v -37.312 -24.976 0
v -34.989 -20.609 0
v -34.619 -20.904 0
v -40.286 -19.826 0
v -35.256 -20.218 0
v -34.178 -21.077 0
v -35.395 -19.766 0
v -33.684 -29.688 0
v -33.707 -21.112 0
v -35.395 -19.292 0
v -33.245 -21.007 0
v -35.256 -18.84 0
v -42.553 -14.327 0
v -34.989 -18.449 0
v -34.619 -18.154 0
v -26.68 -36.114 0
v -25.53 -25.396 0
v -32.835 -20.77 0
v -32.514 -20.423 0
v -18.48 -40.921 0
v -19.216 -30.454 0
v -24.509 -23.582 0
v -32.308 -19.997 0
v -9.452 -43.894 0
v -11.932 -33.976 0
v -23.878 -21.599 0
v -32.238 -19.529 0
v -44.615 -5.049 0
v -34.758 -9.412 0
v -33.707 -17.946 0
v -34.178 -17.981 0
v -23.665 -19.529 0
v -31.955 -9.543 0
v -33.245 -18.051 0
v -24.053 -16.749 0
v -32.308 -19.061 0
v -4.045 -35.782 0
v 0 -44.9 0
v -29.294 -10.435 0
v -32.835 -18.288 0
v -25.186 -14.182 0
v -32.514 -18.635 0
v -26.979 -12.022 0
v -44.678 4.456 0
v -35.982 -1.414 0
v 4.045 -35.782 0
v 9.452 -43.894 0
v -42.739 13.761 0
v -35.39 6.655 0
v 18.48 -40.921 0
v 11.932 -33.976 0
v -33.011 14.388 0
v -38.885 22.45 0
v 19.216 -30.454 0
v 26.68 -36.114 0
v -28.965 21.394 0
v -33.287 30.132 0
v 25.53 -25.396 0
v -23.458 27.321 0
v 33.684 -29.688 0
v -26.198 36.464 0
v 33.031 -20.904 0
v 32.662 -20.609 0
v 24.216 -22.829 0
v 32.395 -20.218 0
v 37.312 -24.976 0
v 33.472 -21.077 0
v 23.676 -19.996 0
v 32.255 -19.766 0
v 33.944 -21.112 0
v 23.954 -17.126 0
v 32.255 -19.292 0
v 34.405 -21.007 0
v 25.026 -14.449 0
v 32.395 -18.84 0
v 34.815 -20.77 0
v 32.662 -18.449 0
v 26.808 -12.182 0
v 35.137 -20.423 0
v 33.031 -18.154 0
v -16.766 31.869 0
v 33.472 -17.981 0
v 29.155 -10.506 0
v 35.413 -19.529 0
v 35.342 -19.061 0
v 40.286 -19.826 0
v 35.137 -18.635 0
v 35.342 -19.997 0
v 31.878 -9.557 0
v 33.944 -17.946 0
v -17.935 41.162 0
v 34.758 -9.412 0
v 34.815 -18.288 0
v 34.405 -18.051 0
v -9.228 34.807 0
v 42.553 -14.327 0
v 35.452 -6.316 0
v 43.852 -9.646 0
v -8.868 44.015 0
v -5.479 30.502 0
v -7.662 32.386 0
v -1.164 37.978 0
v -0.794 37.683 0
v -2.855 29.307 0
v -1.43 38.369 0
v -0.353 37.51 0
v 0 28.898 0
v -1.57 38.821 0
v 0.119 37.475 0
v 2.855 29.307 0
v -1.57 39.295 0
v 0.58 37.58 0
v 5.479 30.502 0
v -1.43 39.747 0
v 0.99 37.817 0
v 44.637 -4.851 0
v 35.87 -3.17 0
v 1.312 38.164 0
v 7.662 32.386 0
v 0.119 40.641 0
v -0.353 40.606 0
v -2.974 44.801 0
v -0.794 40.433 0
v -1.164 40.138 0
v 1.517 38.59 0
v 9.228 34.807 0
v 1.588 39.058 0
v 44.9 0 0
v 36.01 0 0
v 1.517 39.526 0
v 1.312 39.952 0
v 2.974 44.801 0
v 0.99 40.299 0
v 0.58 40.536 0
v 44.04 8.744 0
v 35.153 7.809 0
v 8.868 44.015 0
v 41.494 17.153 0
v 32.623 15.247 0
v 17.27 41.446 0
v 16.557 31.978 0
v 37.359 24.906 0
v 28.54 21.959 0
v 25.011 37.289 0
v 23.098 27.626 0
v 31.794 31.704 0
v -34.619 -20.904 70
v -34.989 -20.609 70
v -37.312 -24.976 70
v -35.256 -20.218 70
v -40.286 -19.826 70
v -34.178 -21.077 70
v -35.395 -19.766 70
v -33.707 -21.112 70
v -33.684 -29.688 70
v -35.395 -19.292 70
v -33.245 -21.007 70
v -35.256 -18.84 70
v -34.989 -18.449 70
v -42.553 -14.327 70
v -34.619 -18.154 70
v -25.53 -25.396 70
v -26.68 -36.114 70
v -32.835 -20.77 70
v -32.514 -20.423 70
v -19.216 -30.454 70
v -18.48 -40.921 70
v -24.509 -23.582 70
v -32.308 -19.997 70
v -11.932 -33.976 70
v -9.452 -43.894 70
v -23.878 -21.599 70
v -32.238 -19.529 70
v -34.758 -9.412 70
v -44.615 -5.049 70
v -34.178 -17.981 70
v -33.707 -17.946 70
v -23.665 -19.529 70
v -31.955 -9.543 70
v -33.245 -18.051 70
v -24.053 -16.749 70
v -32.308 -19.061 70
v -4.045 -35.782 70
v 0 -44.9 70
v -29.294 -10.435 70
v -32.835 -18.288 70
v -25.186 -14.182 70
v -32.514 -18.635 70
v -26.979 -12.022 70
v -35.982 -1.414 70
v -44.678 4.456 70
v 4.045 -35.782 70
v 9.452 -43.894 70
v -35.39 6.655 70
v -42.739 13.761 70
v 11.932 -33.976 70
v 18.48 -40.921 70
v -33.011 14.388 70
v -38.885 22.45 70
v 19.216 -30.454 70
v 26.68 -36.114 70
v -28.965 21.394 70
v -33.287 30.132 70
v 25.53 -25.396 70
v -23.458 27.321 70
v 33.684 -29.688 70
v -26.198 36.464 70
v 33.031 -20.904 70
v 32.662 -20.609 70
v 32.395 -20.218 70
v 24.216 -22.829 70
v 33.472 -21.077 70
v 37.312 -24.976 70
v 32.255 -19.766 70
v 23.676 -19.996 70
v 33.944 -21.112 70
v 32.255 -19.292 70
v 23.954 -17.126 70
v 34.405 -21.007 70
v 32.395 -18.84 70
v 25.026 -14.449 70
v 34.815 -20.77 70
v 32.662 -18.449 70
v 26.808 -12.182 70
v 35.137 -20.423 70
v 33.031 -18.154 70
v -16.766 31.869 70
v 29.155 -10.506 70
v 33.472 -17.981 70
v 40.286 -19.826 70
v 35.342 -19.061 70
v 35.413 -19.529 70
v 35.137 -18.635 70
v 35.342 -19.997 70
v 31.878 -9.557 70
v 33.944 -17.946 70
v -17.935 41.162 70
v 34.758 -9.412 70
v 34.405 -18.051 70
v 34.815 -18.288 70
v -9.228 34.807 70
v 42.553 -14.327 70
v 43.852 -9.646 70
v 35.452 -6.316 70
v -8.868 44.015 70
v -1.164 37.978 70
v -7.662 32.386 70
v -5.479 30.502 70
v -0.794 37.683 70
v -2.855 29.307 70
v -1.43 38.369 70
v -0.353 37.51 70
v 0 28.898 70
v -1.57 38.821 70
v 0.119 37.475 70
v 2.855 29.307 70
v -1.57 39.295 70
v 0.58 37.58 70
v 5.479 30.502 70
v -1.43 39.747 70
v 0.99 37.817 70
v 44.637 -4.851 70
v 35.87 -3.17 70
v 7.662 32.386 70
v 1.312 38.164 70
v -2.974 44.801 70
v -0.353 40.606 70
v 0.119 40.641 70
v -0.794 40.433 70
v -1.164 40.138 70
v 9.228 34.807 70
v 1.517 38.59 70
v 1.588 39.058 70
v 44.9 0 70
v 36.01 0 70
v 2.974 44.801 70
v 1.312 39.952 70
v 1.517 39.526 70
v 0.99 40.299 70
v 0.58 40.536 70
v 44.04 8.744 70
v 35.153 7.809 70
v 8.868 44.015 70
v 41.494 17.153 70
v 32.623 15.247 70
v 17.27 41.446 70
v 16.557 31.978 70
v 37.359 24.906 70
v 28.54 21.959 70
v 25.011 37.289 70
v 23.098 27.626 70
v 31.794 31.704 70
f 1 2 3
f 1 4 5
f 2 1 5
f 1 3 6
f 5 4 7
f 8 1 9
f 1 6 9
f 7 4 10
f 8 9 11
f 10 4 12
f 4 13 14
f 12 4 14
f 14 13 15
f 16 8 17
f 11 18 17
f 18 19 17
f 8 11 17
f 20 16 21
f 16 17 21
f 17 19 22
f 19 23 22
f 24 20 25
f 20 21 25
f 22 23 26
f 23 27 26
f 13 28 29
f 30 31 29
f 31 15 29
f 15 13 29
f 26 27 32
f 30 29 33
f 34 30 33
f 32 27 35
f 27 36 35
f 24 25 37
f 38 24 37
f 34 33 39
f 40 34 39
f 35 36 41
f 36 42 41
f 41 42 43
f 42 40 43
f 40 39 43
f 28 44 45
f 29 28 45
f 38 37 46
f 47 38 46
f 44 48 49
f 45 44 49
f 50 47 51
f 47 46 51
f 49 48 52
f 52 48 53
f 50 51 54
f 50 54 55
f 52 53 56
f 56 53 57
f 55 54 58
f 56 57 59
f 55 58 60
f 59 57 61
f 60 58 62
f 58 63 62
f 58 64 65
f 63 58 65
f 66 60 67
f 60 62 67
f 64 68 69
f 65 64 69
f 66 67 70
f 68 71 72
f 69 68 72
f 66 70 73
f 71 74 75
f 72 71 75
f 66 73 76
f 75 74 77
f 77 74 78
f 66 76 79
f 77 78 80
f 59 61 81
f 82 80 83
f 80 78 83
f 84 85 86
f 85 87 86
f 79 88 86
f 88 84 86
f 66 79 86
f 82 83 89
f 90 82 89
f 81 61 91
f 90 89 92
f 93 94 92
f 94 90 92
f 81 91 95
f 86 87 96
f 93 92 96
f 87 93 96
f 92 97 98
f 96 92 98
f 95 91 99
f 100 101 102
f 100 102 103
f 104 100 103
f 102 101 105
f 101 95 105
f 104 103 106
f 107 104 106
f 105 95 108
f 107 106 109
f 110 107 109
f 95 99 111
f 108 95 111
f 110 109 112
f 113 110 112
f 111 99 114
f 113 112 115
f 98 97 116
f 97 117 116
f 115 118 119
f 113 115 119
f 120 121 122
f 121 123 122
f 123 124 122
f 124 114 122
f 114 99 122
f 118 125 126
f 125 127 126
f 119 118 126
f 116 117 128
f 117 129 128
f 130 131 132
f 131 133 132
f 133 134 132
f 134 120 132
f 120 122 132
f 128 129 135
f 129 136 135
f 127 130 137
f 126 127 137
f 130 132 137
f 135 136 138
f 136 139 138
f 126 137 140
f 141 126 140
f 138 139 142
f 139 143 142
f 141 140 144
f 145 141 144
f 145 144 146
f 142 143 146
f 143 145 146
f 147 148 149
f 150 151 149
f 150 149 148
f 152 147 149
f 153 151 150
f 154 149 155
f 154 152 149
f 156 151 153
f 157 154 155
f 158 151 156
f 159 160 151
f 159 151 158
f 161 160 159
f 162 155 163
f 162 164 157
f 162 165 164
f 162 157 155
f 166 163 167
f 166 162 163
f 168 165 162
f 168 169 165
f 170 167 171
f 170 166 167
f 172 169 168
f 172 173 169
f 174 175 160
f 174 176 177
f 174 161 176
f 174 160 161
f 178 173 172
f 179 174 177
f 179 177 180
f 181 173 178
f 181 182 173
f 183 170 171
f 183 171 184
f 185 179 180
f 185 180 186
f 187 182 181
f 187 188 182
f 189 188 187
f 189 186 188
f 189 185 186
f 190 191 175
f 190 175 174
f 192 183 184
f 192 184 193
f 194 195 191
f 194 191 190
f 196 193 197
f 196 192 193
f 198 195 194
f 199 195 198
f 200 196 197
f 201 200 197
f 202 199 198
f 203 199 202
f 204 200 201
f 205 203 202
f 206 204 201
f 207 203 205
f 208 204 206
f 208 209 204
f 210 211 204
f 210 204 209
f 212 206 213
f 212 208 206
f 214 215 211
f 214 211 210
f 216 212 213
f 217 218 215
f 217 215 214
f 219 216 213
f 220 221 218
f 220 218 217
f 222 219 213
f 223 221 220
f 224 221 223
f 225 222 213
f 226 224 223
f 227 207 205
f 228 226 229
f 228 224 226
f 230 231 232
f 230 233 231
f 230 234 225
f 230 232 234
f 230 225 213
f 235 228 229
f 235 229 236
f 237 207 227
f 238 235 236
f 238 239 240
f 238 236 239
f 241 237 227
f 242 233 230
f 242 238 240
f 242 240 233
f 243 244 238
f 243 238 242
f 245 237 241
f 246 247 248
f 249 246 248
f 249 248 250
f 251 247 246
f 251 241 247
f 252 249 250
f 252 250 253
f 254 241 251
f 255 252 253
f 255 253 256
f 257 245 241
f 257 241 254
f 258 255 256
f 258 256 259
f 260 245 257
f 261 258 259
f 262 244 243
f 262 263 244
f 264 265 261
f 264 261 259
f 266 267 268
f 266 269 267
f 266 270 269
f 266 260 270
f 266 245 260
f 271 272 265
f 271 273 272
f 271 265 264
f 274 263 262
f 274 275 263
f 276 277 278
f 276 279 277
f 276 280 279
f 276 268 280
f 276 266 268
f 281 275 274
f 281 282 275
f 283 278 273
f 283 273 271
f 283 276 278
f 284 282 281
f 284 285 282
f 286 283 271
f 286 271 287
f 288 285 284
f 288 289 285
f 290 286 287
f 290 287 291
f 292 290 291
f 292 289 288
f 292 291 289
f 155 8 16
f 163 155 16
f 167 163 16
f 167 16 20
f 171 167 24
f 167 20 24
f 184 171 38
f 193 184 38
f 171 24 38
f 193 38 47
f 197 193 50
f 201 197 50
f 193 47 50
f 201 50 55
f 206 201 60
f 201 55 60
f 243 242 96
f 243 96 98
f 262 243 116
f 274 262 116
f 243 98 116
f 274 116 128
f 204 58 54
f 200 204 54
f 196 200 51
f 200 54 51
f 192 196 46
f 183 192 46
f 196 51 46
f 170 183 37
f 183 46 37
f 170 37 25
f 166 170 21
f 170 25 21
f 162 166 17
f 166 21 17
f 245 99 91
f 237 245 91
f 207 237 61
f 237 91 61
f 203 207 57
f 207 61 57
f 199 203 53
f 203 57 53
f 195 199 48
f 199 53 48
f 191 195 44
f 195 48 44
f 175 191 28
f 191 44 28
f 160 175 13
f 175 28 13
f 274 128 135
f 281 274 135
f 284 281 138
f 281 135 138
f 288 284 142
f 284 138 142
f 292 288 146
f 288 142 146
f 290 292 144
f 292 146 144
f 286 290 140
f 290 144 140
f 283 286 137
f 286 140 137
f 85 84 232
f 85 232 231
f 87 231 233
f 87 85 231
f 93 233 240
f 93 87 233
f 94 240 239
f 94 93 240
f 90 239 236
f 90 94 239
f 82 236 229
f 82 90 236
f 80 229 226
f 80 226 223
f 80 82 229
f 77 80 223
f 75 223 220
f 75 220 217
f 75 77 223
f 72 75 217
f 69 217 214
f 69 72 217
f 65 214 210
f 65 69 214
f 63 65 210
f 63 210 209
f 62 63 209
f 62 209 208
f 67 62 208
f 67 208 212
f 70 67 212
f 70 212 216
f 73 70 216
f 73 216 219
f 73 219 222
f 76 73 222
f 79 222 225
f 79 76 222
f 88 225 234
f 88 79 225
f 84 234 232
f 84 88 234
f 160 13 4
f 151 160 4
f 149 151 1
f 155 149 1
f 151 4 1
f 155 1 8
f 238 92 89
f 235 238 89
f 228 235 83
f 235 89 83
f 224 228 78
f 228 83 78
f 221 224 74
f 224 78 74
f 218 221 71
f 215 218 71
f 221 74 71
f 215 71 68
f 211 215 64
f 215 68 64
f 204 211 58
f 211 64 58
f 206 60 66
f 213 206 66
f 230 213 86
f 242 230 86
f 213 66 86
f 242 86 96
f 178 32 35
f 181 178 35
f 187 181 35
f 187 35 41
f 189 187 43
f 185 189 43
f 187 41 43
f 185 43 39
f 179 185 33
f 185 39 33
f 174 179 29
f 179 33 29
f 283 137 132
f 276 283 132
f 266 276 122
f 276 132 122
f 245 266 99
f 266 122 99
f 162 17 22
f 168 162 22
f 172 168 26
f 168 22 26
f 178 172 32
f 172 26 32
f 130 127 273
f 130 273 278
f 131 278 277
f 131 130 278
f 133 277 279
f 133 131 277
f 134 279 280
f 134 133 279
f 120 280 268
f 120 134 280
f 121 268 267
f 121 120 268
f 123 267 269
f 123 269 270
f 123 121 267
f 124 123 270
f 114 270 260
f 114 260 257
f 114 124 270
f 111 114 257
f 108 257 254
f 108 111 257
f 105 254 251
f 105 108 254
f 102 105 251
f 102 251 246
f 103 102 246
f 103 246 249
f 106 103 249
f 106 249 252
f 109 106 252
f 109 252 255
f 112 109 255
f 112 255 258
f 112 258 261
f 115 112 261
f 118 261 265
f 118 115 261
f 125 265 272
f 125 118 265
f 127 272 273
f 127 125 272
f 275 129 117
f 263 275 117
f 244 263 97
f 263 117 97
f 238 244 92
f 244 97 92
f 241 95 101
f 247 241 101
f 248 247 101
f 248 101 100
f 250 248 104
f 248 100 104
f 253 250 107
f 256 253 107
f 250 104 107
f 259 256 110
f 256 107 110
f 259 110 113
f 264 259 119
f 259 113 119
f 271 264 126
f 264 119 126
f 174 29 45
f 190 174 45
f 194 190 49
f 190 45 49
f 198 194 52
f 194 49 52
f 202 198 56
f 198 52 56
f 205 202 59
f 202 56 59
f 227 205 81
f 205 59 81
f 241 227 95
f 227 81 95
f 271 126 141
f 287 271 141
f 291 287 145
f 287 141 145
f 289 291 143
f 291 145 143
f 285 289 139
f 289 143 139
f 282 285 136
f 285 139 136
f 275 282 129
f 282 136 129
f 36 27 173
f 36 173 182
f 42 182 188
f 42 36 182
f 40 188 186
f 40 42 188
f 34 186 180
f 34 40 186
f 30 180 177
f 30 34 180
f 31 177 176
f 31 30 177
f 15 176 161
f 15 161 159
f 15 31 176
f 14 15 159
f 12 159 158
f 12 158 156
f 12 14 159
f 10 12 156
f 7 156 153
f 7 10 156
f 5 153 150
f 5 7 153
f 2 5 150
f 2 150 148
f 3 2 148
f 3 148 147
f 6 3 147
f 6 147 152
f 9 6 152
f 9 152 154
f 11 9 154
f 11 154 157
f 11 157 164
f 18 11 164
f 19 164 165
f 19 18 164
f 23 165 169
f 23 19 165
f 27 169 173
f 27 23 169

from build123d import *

# Parameters (mm, degrees)
F0_R     = 1.5875
F1_DEPTH = 70


with BuildPart() as f1:
    # F0 (on Top) → F1 (new body)
    with BuildSketch(Plane.XY):
        with BuildLine():
            ThreePointArc((42.5527261375, -14.32743865), (44.3092958846, -7.2592215983), (44.9, 0))
            ThreePointArc((44.9, 0), (34.7433650607, 28.4413182581), (8.8684372267, 44.0154611603))
            ThreePointArc((8.8684372267, 44.0154611603), (9.8318086389, 41.6194720159), (10.16, 39.058))
            ThreePointArc((10.16, 39.058), (9.9243037361, 36.8822713051), (9.2281505209, 34.807489682))
            ThreePointArc((9.2281505209, 34.807489682), (28.53967239, 21.9592167408), (36.01, 0))
            ThreePointArc((36.01, 0), (35.6956896759, -4.7474033498), (34.758245567, -9.4119320599))
            ThreePointArc((34.758245567, -9.4119320599), (39.2448159004, -10.9351892811), (42.5527261375, -14.32743865))
        make_face()
        with BuildLine():
            ThreePointArc((10.16, 39.058), (9.8318086389, 41.6194720159), (8.8684372267, 44.0154611603))
            ThreePointArc((8.8684372267, 44.0154611603), (0, 44.9), (-8.8684372267, 44.0154611603))
            ThreePointArc((-8.8684372267, 44.0154611603), (-10.1522562376, 39.4546021771), (-9.2281505209, 34.807489682))
            ThreePointArc((-9.2281505209, 34.807489682), (0, 36.01), (9.2281505209, 34.807489682))
            ThreePointArc((9.2281505209, 34.807489682), (9.9243037361, 36.8822713051), (10.16, 39.058))
        make_face()
        with Locations((0, 39.058)):
            Circle(F0_R, mode=Mode.SUBTRACT)
        with BuildLine():
            ThreePointArc((33.6842889108, -29.6880225103), (38.8845406299, -22.45), (42.5527261375, -14.32743865))
            ThreePointArc((42.5527261375, -14.32743865), (39.2448159004, -10.9351892811), (34.758245567, -9.4119320599))
            ThreePointArc((34.758245567, -9.4119320599), (31.1855747903, -18.005), (25.5300950461, -25.3955576221))
            ThreePointArc((25.5300950461, -25.3955576221), (29.0925596628, -28.519412896), (33.6842889108, -29.6880225103))
        make_face()
        with Locations((33.825220221, -19.529)):
            Circle(F0_R, mode=Mode.SUBTRACT)
        with BuildLine():
            ThreePointArc((-9.2281505209, 34.807489682), (-10.1522562376, 39.4546021771), (-8.8684372267, 44.0154611603))
            ThreePointArc((-8.8684372267, 44.0154611603), (-38.8845406299, 22.45), (-42.5527261375, -14.32743865))
            ThreePointArc((-42.5527261375, -14.32743865), (-39.2448159004, -10.9351892811), (-34.758245567, -9.4119320599))
            ThreePointArc((-34.758245567, -9.4119320599), (-31.1855747903, 18.005), (-9.2281505209, 34.807489682))
        make_face()
        with BuildLine():
            ThreePointArc((-33.6842889108, -29.6880225103), (0, -44.9), (33.6842889108, -29.6880225103))
            ThreePointArc((33.6842889108, -29.6880225103), (29.0925596628, -28.519412896), (25.5300950461, -25.3955576221))
            ThreePointArc((25.5300950461, -25.3955576221), (0, -36.01), (-25.5300950461, -25.3955576221))
            ThreePointArc((-25.5300950461, -25.3955576221), (-29.0925596628, -28.519412896), (-33.6842889108, -29.6880225103))
        make_face()
        with BuildLine():
            ThreePointArc((25.5300950461, -25.3955576221), (31.1855747903, -18.005), (34.758245567, -9.4119320599))
            ThreePointArc((34.758245567, -9.4119320599), (25.0264021186, -14.449), (25.5300950461, -25.3955576221))
        make_face()
        with BuildLine():
            ThreePointArc((-34.758245567, -9.4119320599), (-39.2448159004, -10.9351892811), (-42.5527261375, -14.32743865))
            ThreePointArc((-42.5527261375, -14.32743865), (-38.8845406299, -22.45), (-33.6842889108, -29.6880225103))
            ThreePointArc((-33.6842889108, -29.6880225103), (-29.0925596628, -28.519412896), (-25.5300950461, -25.3955576221))
            ThreePointArc((-25.5300950461, -25.3955576221), (-31.1855747903, -18.005), (-34.758245567, -9.4119320599))
        make_face()
        with Locations((-33.825220221, -19.529)):
            Circle(F0_R, mode=Mode.SUBTRACT)
        with BuildLine():
            ThreePointArc((9.2281505209, 34.807489682), (0, 36.01), (-9.2281505209, 34.807489682))
            ThreePointArc((-9.2281505209, 34.807489682), (0, 28.898), (9.2281505209, 34.807489682))
        make_face()
        with BuildLine():
            ThreePointArc((-23.665220221, -19.529), (-26.9788320315, -12.0221651971), (-34.758245567, -9.4119320599))
            ThreePointArc((-34.758245567, -9.4119320599), (-31.1855747903, -18.005), (-25.5300950461, -25.3955576221))
            ThreePointArc((-25.5300950461, -25.3955576221), (-24.1426567232, -22.6069155465), (-23.665220221, -19.529))
        make_face()
    extrude(amount=F1_DEPTH)


solid = f1.part
